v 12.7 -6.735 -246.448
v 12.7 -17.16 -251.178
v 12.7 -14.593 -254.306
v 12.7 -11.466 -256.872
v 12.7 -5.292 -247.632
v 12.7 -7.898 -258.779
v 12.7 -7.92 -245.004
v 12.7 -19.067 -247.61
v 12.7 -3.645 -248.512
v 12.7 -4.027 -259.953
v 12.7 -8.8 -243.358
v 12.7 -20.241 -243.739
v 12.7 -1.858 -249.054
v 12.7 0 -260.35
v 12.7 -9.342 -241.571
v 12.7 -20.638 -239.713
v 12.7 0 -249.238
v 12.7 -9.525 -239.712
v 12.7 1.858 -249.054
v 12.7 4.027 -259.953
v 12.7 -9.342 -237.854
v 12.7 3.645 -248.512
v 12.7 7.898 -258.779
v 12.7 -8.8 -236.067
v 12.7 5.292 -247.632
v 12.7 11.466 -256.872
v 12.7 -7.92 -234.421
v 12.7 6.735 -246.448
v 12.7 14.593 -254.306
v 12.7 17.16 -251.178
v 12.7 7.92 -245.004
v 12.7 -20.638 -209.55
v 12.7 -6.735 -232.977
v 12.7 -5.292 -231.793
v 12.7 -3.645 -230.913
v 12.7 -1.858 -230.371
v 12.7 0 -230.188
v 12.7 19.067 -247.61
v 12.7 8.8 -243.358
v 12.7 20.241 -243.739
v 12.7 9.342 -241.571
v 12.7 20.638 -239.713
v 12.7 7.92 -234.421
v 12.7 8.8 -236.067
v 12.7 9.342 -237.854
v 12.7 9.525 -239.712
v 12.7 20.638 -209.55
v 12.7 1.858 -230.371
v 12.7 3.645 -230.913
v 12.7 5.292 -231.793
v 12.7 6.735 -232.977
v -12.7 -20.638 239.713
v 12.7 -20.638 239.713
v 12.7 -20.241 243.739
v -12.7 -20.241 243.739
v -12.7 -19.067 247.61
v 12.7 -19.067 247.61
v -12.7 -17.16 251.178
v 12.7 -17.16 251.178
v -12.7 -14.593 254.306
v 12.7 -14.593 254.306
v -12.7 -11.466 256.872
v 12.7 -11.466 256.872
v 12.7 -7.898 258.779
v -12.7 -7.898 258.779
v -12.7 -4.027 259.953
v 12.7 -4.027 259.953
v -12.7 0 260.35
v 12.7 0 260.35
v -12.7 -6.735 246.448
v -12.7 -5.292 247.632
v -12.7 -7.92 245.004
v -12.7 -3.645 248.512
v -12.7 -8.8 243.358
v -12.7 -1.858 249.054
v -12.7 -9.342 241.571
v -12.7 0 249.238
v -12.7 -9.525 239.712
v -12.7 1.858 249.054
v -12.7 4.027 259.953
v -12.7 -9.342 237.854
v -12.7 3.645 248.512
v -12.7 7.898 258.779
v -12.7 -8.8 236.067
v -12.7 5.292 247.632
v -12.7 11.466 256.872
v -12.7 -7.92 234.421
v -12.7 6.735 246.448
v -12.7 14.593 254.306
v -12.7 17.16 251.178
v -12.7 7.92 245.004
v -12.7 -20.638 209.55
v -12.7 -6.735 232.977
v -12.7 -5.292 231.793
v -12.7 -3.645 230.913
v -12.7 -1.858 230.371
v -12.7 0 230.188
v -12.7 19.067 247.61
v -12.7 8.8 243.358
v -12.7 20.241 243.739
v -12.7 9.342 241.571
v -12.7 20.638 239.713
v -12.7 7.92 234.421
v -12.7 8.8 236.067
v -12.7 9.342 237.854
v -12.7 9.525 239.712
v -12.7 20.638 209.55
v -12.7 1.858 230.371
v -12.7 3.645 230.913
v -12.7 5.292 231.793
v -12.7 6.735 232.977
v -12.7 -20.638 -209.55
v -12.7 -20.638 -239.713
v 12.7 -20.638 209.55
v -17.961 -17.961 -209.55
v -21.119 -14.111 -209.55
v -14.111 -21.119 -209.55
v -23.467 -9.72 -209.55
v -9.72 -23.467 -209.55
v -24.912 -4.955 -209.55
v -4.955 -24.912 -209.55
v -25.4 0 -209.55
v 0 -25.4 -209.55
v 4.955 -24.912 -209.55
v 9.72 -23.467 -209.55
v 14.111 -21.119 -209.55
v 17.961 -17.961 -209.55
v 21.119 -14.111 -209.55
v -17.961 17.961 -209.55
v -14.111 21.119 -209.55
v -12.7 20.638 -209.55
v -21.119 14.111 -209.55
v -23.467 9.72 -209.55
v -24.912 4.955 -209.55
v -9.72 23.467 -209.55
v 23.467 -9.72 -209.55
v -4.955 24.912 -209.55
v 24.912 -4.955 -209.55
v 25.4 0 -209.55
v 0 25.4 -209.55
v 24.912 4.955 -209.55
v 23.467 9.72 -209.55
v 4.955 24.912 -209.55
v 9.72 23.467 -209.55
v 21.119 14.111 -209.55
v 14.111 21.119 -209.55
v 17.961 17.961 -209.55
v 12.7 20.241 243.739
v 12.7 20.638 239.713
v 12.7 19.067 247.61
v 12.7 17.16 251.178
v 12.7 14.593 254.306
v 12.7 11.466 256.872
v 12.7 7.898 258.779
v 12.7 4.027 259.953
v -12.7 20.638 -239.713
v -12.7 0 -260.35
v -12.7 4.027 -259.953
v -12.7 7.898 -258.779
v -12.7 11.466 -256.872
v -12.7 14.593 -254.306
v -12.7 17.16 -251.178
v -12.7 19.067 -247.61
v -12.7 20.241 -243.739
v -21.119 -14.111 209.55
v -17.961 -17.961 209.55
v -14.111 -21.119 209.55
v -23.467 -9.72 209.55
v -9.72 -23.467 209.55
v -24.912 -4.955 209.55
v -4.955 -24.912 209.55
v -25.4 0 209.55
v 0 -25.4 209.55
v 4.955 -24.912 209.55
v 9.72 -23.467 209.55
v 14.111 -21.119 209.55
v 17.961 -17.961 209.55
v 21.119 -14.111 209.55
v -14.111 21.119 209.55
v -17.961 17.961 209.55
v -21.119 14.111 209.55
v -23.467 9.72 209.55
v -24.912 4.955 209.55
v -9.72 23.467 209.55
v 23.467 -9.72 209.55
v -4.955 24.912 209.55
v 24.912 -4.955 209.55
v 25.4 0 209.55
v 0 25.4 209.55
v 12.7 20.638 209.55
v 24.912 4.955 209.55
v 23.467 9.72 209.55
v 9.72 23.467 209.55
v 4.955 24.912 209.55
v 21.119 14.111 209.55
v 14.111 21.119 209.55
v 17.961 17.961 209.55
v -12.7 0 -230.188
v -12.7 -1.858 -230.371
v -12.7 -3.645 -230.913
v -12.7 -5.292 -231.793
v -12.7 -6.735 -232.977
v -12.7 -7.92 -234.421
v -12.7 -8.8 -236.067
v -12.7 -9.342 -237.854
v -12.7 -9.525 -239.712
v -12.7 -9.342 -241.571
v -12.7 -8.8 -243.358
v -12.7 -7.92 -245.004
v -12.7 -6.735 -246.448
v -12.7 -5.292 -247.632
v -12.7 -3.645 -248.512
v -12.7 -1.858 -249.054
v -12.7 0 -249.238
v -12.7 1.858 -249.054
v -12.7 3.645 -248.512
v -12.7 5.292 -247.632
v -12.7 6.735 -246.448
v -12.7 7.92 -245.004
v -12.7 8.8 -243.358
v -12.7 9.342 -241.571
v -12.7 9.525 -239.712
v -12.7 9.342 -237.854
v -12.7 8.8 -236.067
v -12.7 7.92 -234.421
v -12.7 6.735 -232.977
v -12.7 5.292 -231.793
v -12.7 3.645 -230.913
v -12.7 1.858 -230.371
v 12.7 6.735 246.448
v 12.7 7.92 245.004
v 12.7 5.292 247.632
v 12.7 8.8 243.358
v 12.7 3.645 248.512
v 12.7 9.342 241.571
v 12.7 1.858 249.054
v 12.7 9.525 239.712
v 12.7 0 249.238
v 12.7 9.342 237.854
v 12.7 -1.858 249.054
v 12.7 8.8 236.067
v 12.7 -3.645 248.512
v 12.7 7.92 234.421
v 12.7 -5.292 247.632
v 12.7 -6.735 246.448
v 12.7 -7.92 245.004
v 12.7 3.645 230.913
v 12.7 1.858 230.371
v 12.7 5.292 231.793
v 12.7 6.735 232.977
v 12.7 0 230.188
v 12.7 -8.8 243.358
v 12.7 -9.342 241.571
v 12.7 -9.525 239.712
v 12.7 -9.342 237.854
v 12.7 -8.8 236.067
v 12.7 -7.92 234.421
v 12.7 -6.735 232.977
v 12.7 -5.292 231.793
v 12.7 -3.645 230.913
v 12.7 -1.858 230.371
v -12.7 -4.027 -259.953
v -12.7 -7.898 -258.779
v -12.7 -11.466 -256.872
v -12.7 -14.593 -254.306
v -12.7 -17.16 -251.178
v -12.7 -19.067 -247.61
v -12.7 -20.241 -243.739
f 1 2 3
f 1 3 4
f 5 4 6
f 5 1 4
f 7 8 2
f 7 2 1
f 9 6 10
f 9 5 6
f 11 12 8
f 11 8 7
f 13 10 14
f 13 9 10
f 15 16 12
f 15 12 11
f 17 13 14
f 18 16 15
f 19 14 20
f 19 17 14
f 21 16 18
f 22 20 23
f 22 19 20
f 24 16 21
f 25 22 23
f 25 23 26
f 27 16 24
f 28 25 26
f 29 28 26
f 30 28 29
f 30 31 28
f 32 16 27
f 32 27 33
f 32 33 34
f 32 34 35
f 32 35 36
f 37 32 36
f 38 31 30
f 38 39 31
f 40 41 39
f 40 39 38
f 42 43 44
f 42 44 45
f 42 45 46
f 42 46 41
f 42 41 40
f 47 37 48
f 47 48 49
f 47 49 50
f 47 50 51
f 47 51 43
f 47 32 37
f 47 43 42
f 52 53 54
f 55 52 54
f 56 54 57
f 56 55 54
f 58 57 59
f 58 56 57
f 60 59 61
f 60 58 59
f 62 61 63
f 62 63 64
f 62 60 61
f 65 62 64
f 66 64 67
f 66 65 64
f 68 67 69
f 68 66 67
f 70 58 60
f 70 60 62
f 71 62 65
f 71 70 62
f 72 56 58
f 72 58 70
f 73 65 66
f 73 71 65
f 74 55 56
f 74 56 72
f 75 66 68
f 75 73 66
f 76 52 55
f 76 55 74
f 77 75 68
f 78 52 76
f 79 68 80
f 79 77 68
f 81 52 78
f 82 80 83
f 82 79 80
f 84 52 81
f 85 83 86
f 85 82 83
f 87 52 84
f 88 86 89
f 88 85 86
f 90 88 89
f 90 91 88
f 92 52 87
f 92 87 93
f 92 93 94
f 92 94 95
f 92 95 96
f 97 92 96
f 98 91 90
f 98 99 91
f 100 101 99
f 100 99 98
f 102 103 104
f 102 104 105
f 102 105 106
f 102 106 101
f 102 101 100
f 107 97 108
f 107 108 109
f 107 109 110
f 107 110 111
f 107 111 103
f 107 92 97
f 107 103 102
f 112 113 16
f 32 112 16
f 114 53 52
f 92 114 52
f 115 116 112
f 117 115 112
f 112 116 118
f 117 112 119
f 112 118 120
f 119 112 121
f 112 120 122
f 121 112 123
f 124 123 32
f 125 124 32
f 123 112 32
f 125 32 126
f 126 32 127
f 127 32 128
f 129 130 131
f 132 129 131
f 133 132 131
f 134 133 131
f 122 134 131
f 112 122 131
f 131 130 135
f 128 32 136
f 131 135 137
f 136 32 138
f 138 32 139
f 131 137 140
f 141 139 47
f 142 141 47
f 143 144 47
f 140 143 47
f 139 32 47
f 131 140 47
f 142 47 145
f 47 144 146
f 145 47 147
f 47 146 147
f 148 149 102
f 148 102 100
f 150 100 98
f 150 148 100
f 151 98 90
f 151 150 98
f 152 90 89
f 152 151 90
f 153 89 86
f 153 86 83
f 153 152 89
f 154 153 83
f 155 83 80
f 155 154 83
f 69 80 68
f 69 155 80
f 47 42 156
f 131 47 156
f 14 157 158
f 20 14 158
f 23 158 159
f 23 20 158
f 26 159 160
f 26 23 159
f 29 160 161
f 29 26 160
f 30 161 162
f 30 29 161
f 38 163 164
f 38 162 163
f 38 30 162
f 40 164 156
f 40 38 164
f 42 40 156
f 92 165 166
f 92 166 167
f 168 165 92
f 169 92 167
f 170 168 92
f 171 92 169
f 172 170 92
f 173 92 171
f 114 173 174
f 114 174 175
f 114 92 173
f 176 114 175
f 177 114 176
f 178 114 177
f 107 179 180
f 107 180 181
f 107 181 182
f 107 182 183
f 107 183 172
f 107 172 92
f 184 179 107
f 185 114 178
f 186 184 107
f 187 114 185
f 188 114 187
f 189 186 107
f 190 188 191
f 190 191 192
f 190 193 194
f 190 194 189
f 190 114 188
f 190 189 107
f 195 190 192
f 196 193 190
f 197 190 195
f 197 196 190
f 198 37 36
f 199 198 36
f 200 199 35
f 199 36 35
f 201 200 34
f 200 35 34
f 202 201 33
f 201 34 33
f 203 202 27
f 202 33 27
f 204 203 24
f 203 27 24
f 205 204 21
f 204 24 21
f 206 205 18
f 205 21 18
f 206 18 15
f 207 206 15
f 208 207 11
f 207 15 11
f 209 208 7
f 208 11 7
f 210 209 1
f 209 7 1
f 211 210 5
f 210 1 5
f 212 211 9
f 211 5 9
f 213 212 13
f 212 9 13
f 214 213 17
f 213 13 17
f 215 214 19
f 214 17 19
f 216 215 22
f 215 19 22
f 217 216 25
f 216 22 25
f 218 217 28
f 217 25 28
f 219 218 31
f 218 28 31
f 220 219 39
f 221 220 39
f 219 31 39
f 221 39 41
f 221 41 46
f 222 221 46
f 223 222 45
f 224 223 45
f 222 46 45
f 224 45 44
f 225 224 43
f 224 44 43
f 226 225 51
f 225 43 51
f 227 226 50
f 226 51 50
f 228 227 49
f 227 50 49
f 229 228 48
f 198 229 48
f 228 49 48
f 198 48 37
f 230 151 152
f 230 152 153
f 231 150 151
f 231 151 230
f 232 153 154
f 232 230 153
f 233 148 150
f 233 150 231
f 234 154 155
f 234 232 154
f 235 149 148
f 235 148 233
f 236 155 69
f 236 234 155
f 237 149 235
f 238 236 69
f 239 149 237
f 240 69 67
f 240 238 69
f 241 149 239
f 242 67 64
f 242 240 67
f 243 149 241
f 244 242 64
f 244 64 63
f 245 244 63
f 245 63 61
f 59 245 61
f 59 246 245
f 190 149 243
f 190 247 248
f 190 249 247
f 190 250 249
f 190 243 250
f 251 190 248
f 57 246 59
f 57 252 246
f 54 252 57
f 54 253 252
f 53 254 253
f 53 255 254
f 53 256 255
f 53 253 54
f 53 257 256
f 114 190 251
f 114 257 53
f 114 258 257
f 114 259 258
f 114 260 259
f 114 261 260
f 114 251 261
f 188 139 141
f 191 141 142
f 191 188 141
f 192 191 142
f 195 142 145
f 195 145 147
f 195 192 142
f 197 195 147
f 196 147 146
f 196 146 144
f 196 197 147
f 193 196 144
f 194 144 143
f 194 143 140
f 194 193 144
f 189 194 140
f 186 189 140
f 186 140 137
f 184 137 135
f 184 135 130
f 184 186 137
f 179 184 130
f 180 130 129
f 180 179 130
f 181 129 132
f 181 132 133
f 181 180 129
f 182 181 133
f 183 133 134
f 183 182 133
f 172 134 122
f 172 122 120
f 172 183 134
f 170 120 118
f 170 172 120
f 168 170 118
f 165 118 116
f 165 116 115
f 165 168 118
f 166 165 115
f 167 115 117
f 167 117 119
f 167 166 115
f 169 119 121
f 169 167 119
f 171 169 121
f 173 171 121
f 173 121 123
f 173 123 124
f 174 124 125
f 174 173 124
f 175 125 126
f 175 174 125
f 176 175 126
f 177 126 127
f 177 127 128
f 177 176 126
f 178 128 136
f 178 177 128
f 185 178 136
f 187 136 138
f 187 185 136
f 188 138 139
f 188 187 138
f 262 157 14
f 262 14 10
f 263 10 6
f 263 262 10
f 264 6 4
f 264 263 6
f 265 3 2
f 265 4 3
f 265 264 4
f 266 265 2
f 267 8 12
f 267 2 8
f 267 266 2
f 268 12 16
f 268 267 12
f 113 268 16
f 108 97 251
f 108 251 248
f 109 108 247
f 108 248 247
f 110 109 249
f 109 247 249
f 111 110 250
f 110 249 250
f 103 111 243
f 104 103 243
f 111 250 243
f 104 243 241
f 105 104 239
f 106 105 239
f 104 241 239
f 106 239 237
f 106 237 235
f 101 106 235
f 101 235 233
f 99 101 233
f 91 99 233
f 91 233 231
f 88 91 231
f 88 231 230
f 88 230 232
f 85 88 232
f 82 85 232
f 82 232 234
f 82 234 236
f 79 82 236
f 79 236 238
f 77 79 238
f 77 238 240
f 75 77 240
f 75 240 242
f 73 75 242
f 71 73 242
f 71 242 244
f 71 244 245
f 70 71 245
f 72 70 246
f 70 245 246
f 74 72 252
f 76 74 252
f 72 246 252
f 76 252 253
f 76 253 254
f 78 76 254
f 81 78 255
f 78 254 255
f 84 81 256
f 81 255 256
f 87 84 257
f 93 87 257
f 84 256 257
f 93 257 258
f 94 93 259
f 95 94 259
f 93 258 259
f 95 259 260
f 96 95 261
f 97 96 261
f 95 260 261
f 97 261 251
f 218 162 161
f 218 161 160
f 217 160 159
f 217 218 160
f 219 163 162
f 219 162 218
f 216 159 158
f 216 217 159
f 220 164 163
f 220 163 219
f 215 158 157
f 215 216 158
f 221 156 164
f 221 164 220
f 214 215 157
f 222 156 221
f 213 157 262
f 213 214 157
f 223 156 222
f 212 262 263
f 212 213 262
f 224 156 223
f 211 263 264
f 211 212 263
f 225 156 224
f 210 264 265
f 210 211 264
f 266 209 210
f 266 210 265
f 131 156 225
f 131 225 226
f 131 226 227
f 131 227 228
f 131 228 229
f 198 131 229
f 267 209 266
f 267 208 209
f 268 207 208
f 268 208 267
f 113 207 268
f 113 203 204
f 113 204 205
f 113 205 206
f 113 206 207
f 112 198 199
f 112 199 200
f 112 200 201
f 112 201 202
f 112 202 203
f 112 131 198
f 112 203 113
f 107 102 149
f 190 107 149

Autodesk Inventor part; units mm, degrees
ref_plane "YZ Plane" through (0, 0, 0) normal (1, 0, 0) x (0, 1, 0)
ref_plane "XZ Plane" through (0, 0, 0) normal (0, 1, 0) x (-1, 0, 0)
ref_plane "XY Plane" through (0, 0, 0) normal (0, 0, 1) x (1, 0, 0)
sketch "Sketch1" plane through (0, 0, 0) normal (0, 0, 1) x (1, 0, 0)
  circle A0 centre (0, 0) radius 25.4
  dimension "d0" = 50.8
extrude "Extrusion1" add sketch "Sketch1" along normal mid plane 419.1
sketch "Sketch4" plane through (0, 0, 209.55) normal (0, 0, 1) x (1, 0, 0)
  line L0 (-12.7, 20.6375) -> (12.7, 20.6375)
  line L1 (12.7, 20.6375) -> (12.7, -20.6375)
  line L2 (12.7, -20.6375) -> (-12.7, -20.6375)
  line L3 (-12.7, -20.6375) -> (-12.7, 20.6375)
  line L4 (-12.7, 20.6375) -> (12.7, -20.6375) construction
  line L5 (12.7, 20.6375) -> (-12.7, -20.6375) construction
  point P0 (0, 0)
  dimension "d15" = 25.4
  dimension "d16" = 41.275
extrude "Extrusion4" add sketch "Sketch4" along normal blind 50.8
fillet "Fillet2" radius 20.6375 2 edges at (0, 20.6375, 260.35) (0, -20.6375, 260.35)
sketch "Sketch5" plane through (12.7, -20.6375, 209.55) normal (1, 0, 0) x (0, 0, -1)
  arc A0 (-30.1625, 41.275) -> (-30.1625, 0) centre (-30.1625, 20.6375) ccw projected
  circle A1 centre (-30.1625, 20.6375) radius 9.525
  point P0 (209.55, 20.6375)
extrude "Extrusion5" cut sketch "Sketch5" against normal blind 50.8
mirror "Mirror1" about plane through (0, 0, 0) normal (0, 0, 1) of "Extrusion4", "Fillet2", "Extrusion5"
properties part number "body to wheel hub connectors (22 in)"
